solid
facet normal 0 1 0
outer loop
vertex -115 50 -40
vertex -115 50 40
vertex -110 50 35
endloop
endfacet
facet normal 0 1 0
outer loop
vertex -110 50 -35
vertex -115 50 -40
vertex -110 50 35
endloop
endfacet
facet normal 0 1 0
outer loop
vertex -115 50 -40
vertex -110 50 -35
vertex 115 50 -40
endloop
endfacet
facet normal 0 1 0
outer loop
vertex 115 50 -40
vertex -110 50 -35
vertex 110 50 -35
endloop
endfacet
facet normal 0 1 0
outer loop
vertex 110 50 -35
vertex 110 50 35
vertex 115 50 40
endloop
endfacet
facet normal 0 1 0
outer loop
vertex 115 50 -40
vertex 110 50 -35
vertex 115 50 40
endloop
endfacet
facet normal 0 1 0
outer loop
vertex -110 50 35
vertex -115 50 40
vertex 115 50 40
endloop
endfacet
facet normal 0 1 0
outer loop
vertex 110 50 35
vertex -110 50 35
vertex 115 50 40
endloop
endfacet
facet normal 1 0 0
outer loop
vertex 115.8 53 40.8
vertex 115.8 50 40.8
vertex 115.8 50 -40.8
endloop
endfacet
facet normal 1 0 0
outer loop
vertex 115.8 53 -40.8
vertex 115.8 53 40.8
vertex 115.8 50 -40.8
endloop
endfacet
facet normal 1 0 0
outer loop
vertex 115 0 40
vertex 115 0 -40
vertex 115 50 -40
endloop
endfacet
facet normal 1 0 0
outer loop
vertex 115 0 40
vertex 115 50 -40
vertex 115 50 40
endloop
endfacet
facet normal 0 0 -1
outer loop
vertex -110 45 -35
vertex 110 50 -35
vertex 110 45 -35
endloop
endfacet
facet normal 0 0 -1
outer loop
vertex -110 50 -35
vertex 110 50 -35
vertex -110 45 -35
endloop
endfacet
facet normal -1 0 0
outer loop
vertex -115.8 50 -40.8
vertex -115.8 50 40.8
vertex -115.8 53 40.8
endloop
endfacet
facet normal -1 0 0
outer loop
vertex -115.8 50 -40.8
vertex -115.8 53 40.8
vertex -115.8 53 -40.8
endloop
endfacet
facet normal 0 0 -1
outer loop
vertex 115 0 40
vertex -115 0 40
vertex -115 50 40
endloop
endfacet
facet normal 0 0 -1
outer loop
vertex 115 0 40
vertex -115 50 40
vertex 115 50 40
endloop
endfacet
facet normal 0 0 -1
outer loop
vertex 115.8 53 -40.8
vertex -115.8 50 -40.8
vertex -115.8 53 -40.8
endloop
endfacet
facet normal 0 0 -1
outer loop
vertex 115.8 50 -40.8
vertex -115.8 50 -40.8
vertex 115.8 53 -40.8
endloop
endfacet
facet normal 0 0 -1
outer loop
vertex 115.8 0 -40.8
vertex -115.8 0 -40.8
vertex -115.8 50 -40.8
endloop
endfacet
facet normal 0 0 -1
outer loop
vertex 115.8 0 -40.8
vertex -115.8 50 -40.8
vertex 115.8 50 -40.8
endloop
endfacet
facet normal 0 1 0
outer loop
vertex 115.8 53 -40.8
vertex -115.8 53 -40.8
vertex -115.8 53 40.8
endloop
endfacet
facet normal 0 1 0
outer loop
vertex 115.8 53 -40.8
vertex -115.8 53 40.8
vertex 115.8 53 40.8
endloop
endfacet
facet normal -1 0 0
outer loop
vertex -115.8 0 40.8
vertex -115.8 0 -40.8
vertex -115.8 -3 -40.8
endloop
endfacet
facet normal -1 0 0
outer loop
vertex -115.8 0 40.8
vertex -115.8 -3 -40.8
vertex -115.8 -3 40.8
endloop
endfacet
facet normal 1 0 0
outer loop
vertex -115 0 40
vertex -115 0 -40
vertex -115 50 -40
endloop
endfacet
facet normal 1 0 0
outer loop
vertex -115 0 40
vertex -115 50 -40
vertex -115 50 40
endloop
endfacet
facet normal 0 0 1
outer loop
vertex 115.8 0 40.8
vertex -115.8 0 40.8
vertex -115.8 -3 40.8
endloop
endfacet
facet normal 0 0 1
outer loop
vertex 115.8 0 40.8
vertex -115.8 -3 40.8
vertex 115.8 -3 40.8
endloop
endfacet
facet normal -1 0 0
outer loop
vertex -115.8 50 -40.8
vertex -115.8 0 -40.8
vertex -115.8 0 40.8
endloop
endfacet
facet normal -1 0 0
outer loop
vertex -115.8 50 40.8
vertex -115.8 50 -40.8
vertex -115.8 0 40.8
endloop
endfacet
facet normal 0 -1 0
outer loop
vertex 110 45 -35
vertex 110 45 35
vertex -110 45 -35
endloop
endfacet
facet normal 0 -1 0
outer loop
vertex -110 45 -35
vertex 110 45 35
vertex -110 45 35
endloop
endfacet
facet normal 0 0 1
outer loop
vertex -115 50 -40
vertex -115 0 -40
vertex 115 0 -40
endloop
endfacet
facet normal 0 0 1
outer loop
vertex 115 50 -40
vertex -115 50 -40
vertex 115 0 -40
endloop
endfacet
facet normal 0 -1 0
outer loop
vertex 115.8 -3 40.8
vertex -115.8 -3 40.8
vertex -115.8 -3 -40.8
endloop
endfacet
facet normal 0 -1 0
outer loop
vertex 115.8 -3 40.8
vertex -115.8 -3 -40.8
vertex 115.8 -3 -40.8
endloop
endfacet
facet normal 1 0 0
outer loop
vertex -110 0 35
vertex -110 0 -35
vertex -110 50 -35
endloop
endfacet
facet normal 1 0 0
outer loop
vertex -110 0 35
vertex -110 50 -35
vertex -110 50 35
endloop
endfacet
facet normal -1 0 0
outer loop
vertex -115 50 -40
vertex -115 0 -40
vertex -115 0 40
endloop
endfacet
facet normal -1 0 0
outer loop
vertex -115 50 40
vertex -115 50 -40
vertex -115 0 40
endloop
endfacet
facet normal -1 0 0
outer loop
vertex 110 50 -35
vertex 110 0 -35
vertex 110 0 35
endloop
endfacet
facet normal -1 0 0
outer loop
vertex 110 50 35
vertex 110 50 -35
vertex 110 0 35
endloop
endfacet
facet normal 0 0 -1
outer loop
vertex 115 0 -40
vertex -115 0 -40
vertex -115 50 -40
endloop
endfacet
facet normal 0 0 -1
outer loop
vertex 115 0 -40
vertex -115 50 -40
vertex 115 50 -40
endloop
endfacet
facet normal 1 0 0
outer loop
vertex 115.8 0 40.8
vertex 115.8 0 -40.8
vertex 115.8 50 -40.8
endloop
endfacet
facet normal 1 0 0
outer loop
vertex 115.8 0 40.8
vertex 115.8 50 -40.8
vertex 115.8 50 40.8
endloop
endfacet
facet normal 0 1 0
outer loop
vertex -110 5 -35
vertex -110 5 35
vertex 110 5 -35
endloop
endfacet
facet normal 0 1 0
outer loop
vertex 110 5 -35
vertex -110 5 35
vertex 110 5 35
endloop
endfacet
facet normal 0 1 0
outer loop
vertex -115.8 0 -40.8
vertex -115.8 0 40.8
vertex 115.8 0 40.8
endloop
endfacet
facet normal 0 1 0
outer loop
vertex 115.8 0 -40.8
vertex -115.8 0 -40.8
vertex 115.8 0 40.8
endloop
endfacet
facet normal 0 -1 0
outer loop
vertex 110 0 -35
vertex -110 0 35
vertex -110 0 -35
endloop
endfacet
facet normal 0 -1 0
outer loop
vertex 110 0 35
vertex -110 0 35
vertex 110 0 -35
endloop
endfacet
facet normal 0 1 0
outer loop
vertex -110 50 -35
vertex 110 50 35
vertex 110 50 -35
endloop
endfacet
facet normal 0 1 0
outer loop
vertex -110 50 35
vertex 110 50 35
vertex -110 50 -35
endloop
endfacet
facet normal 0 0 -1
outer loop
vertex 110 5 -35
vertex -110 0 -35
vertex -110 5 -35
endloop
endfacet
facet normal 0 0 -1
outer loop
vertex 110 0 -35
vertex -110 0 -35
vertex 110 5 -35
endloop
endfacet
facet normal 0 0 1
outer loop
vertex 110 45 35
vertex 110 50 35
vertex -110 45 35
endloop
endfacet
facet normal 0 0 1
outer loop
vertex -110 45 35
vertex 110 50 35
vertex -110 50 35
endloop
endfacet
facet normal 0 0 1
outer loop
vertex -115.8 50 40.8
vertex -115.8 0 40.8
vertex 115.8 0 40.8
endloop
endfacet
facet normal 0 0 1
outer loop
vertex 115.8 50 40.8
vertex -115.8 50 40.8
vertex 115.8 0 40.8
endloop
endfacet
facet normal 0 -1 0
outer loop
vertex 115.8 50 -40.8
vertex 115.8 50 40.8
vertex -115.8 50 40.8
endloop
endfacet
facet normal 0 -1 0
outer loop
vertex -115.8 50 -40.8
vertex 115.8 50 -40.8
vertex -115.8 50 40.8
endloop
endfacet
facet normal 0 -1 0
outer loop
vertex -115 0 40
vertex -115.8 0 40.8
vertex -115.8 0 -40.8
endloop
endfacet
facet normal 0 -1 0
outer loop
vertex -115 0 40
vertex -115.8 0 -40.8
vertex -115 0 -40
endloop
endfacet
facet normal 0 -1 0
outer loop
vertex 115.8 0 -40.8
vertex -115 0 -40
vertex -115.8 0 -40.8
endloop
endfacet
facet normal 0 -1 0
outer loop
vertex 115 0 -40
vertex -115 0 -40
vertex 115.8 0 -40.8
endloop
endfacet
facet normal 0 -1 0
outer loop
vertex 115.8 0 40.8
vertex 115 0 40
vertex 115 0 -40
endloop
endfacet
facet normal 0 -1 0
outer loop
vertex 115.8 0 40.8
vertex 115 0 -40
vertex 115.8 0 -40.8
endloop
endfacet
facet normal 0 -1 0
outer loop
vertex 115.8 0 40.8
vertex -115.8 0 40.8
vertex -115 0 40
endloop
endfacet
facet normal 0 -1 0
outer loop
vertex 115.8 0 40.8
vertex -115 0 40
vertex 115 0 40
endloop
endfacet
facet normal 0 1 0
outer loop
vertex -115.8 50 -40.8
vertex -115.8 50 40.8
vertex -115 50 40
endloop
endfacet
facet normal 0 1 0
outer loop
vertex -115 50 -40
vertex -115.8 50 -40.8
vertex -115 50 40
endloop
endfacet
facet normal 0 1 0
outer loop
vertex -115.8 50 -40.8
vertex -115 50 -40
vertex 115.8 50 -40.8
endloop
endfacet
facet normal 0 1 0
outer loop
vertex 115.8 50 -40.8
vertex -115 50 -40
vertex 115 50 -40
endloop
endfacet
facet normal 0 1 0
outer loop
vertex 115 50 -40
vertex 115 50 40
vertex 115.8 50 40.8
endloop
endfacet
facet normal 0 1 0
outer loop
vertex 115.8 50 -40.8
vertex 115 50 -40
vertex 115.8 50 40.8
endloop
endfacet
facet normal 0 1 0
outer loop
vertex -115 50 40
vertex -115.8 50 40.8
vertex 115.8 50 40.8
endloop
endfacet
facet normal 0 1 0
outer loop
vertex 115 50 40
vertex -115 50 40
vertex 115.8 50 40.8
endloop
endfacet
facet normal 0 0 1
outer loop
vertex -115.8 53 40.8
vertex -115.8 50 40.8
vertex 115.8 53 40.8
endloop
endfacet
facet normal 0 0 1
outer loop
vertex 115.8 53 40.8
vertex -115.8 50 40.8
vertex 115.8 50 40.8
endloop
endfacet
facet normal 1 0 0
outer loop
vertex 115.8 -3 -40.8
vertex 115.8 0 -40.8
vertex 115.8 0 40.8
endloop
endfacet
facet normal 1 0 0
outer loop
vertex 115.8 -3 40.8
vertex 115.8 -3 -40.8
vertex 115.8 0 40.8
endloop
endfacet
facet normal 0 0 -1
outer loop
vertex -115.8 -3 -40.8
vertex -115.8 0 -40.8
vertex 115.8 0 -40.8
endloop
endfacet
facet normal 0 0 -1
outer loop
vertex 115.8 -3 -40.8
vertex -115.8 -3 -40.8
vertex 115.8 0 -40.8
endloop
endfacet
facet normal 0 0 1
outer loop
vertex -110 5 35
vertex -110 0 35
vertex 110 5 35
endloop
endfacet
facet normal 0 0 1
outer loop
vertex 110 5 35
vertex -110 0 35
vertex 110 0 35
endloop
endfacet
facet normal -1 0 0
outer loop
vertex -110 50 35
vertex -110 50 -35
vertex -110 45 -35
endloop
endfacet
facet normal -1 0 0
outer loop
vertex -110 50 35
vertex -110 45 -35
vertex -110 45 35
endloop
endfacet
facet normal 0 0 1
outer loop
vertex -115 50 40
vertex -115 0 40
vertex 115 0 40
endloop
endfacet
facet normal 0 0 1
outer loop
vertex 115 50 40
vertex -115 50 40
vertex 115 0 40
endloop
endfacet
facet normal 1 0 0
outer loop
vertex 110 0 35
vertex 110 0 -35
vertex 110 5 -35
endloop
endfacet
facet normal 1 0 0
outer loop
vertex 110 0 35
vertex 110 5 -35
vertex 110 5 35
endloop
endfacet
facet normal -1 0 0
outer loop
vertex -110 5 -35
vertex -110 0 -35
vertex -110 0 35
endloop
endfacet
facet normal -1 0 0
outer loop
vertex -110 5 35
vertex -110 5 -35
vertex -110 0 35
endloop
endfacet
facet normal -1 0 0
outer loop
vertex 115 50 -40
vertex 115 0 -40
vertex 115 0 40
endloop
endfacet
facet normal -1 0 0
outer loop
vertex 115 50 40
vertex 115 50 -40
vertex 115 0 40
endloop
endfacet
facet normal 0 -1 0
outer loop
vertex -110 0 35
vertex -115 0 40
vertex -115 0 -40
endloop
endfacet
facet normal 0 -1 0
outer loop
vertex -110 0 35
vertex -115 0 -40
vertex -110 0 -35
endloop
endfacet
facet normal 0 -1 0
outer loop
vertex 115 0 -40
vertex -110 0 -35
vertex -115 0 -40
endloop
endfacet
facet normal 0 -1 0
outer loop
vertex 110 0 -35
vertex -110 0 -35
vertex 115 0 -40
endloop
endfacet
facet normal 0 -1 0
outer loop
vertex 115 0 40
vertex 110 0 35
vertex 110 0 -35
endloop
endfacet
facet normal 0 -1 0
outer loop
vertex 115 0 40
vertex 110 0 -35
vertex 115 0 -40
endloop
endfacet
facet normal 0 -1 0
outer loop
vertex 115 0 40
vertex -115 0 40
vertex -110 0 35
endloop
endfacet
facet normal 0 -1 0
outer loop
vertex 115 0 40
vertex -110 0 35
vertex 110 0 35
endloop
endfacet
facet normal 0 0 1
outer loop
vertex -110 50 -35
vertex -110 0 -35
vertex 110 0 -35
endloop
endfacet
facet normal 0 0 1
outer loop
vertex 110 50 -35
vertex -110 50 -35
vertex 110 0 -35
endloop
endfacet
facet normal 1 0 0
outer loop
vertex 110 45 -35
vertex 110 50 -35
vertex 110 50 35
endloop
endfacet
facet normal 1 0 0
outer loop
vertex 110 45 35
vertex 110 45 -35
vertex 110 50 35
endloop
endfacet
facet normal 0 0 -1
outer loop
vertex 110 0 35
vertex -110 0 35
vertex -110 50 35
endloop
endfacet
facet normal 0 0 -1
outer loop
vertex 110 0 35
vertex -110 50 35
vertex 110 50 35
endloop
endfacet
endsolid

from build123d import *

# Parameters (mm, degrees)
F0_W        = 230
F0_H        = 80
F0_W_2      = 220
F0_H_2      = 70
F1_DEPTH    = 50
F2_DEPTH    = 5
F0_W_3      = 231.6
F0_H_3      = 81.6
F3_DEPTH    = 3
F4_DEPTH    = 50
F5_W        = 220
F5_H        = 70
F6_DEPTH    = 5
F4_FACE_W   = 231.6
F4_FACE_H   = 81.6
F4_FACE_W_2 = 230
F4_FACE_H_2 = 80
F1_FACE_W   = 230
F1_FACE_H   = 80
F1_FACE_W_2 = 220
F1_FACE_H_2 = 70
F6_FACE_W   = 220
F6_FACE_H   = 70
F7_DEPTH    = 3


with BuildPart() as f1:
    # F0 (on Front) → F1 (new body)
    with BuildSketch(Plane.XZ):
        Rectangle(F0_W, F0_H)
        Rectangle(F0_W_2, F0_H_2, mode=Mode.SUBTRACT)
    extrude(amount=-F1_DEPTH)


with BuildPart() as f2:
    # F0 (on Front) → F2 (new body)
    with BuildSketch(Plane.XZ):
        Rectangle(F0_W_2, F0_H_2)
    extrude(amount=-F2_DEPTH)


with BuildPart() as f3:
    # F0 (on Front) → F3 (new body)
    with BuildSketch(Plane.XZ):
        Rectangle(F0_W_3, F0_H_3)
        Rectangle(F0_W, F0_H, mode=Mode.SUBTRACT)
        Rectangle(F0_W, F0_H)
        Rectangle(F0_W_2, F0_H_2, mode=Mode.SUBTRACT)
        Rectangle(F0_W_2, F0_H_2)
    extrude(amount=F3_DEPTH)


with BuildPart() as f4:
    # F0 (on Front) → F4 (new body)
    with BuildSketch(Plane.XZ):
        Rectangle(F0_W_3, F0_H_3)
        Rectangle(F0_W, F0_H, mode=Mode.SUBTRACT)
    extrude(amount=-F4_DEPTH)


with BuildPart() as f6:
    # F5 (on face) → F6 (new body)
    with BuildSketch(Plane(origin=(0, 50, 0), x_dir=(-1, 0, 0), z_dir=(0, 1, 0))):
        Rectangle(F5_W, F5_H)
    extrude(amount=-F6_DEPTH)


with BuildPart() as f7:
    # F4_face (on face) + F1_face (on face) + F6_face (on face) → F7 (new body)
    with BuildSketch(Plane(origin=(0, 50, 0), x_dir=(1, 0, 0), z_dir=(0, 1, 0))):
        Rectangle(F4_FACE_W, F4_FACE_H)
        Rectangle(F4_FACE_W_2, F4_FACE_H_2, mode=Mode.SUBTRACT)
    with BuildSketch(Plane(origin=(0, 50, 0), x_dir=(1, 0, 0), z_dir=(0, 1, 0))):
        Rectangle(F1_FACE_W, F1_FACE_H)
        Rectangle(F1_FACE_W_2, F1_FACE_H_2, mode=Mode.SUBTRACT)
    with BuildSketch(Plane(origin=(0, 50, 0), x_dir=(-1, 0, 0), z_dir=(0, 1, 0))):
        Rectangle(F6_FACE_W, F6_FACE_H)
    extrude(amount=F7_DEPTH)


solid = Compound([f1.part, f2.part, f3.part, f4.part, f6.part, f7.part])
